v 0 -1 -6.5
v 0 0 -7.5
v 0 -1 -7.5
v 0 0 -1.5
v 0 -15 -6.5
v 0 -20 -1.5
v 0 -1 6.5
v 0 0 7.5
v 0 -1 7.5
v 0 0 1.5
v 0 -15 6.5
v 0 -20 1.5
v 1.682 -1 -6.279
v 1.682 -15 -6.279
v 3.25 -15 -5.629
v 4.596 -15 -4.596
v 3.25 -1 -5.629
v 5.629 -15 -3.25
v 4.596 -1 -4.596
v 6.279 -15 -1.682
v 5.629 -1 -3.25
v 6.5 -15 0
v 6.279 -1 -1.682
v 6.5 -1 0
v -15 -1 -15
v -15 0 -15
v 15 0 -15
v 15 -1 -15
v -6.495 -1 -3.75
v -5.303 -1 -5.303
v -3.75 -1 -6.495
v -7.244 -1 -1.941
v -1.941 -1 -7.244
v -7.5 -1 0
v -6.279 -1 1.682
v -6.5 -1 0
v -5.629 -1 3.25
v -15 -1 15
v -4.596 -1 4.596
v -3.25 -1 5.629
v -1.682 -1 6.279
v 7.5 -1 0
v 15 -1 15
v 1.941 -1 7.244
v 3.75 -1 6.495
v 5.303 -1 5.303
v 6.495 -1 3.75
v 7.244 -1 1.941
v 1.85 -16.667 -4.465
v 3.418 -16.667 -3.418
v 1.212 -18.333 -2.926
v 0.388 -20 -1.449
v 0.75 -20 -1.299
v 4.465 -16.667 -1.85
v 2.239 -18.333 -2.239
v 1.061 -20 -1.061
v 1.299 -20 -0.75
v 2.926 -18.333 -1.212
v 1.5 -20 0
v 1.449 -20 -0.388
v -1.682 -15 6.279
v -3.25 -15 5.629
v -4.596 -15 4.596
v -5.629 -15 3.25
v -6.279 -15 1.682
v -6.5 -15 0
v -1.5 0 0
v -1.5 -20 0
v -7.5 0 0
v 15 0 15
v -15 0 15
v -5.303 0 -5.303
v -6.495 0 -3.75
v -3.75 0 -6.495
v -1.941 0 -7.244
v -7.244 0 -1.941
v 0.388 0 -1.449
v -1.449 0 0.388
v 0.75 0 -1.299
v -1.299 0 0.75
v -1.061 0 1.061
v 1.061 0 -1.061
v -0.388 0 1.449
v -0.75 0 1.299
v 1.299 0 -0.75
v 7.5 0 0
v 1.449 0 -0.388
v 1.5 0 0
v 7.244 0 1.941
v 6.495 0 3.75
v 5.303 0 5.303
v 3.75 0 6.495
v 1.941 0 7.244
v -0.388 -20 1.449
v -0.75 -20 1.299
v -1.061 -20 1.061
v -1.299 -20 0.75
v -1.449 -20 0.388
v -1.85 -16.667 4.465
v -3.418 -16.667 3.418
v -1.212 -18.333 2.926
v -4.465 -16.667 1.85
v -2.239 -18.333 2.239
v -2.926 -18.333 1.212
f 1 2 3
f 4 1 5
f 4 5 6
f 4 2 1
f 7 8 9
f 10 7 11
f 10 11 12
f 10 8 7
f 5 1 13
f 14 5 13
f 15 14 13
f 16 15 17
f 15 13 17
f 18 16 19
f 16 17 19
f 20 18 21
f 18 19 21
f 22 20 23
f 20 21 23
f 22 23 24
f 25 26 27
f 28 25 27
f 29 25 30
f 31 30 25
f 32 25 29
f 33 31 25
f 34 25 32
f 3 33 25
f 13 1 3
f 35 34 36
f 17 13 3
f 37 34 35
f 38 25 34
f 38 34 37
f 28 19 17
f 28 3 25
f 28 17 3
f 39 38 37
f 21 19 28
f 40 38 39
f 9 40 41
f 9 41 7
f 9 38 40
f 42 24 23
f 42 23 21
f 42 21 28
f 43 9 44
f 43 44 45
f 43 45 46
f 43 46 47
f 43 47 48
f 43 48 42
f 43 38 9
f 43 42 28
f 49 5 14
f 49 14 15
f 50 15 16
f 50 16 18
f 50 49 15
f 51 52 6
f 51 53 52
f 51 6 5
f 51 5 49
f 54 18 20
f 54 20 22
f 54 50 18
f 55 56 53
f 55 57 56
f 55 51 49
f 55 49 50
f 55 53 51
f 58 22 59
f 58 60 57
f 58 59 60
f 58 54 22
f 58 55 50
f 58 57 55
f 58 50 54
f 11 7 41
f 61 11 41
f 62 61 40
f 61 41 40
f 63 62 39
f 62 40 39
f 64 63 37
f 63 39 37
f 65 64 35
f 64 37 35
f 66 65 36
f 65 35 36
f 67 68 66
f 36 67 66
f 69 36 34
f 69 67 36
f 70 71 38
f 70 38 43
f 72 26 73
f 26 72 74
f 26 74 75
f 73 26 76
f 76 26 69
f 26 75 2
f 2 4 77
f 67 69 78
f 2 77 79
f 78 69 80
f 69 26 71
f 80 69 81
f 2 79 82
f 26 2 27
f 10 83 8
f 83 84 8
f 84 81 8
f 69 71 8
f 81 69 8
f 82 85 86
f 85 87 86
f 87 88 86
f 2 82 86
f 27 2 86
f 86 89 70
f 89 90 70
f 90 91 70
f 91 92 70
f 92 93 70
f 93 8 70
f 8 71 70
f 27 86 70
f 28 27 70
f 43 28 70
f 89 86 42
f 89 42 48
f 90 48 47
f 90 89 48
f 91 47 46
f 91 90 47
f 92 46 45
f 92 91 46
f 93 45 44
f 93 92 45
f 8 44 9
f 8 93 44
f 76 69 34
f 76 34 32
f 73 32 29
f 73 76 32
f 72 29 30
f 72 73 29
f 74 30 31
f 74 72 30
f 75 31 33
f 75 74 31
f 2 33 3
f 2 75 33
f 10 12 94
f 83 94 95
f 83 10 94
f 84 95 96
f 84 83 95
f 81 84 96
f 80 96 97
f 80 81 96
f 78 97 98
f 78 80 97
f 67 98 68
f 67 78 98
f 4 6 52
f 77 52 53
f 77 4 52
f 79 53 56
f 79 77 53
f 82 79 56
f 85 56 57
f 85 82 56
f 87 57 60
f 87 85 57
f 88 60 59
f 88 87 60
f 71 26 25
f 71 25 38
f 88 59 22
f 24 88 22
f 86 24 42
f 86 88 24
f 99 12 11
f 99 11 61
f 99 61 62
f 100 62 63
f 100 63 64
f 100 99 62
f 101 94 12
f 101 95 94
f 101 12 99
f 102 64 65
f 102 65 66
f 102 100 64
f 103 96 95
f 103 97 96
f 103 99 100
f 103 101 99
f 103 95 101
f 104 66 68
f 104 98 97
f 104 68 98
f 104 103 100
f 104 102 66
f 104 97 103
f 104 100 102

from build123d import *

# Parameters (mm, degrees)
F0_R     = 6.5
F1_DEPTH = 20
F2_SIZE  = 5
F3_W     = 30
F3_H     = 30
F4_DEPTH = 1
F6_DEPTH = 25


with BuildPart() as f1:
    # F0 (on Front) → F1 (new body)
    with BuildSketch(Plane.XZ):
        Circle(F0_R)
    extrude(amount=F1_DEPTH)

    # F2
    f2_edges = [f1.edges().sort_by_distance(p)[0] for p in [
        (-6.5, -20, 0),
    ]]
    chamfer(f2_edges, length=F2_SIZE)

    # F3 (on Front) → F4 (join)
    with BuildSketch(Plane.XZ):
        Rectangle(F3_W, F3_H)
    extrude(amount=F4_DEPTH)

    # F5 (on Front) → F6 (cut)
    with BuildSketch(Plane.XZ):
        with BuildLine():
            Line((-1.5, 0), (-7.5, 0))
            ThreePointArc((-7.5, 0), (-5.303301, -5.303301), (0, -7.5))
            Line((0, -7.5), (0, -1.5))
            ThreePointArc((0, -1.5), (1.06066, -1.06066), (1.5, 0))
            Line((1.5, 0), (7.5, 0))
            ThreePointArc((7.5, 0), (5.303301, 5.303301), (0, 7.5))
            Line((0, 7.5), (0, 1.5))
            ThreePointArc((0, 1.5), (-1.06066, 1.06066), (-1.5, 0))
        make_face()
    extrude(amount=F6_DEPTH, mode=Mode.SUBTRACT)


solid = f1.part
